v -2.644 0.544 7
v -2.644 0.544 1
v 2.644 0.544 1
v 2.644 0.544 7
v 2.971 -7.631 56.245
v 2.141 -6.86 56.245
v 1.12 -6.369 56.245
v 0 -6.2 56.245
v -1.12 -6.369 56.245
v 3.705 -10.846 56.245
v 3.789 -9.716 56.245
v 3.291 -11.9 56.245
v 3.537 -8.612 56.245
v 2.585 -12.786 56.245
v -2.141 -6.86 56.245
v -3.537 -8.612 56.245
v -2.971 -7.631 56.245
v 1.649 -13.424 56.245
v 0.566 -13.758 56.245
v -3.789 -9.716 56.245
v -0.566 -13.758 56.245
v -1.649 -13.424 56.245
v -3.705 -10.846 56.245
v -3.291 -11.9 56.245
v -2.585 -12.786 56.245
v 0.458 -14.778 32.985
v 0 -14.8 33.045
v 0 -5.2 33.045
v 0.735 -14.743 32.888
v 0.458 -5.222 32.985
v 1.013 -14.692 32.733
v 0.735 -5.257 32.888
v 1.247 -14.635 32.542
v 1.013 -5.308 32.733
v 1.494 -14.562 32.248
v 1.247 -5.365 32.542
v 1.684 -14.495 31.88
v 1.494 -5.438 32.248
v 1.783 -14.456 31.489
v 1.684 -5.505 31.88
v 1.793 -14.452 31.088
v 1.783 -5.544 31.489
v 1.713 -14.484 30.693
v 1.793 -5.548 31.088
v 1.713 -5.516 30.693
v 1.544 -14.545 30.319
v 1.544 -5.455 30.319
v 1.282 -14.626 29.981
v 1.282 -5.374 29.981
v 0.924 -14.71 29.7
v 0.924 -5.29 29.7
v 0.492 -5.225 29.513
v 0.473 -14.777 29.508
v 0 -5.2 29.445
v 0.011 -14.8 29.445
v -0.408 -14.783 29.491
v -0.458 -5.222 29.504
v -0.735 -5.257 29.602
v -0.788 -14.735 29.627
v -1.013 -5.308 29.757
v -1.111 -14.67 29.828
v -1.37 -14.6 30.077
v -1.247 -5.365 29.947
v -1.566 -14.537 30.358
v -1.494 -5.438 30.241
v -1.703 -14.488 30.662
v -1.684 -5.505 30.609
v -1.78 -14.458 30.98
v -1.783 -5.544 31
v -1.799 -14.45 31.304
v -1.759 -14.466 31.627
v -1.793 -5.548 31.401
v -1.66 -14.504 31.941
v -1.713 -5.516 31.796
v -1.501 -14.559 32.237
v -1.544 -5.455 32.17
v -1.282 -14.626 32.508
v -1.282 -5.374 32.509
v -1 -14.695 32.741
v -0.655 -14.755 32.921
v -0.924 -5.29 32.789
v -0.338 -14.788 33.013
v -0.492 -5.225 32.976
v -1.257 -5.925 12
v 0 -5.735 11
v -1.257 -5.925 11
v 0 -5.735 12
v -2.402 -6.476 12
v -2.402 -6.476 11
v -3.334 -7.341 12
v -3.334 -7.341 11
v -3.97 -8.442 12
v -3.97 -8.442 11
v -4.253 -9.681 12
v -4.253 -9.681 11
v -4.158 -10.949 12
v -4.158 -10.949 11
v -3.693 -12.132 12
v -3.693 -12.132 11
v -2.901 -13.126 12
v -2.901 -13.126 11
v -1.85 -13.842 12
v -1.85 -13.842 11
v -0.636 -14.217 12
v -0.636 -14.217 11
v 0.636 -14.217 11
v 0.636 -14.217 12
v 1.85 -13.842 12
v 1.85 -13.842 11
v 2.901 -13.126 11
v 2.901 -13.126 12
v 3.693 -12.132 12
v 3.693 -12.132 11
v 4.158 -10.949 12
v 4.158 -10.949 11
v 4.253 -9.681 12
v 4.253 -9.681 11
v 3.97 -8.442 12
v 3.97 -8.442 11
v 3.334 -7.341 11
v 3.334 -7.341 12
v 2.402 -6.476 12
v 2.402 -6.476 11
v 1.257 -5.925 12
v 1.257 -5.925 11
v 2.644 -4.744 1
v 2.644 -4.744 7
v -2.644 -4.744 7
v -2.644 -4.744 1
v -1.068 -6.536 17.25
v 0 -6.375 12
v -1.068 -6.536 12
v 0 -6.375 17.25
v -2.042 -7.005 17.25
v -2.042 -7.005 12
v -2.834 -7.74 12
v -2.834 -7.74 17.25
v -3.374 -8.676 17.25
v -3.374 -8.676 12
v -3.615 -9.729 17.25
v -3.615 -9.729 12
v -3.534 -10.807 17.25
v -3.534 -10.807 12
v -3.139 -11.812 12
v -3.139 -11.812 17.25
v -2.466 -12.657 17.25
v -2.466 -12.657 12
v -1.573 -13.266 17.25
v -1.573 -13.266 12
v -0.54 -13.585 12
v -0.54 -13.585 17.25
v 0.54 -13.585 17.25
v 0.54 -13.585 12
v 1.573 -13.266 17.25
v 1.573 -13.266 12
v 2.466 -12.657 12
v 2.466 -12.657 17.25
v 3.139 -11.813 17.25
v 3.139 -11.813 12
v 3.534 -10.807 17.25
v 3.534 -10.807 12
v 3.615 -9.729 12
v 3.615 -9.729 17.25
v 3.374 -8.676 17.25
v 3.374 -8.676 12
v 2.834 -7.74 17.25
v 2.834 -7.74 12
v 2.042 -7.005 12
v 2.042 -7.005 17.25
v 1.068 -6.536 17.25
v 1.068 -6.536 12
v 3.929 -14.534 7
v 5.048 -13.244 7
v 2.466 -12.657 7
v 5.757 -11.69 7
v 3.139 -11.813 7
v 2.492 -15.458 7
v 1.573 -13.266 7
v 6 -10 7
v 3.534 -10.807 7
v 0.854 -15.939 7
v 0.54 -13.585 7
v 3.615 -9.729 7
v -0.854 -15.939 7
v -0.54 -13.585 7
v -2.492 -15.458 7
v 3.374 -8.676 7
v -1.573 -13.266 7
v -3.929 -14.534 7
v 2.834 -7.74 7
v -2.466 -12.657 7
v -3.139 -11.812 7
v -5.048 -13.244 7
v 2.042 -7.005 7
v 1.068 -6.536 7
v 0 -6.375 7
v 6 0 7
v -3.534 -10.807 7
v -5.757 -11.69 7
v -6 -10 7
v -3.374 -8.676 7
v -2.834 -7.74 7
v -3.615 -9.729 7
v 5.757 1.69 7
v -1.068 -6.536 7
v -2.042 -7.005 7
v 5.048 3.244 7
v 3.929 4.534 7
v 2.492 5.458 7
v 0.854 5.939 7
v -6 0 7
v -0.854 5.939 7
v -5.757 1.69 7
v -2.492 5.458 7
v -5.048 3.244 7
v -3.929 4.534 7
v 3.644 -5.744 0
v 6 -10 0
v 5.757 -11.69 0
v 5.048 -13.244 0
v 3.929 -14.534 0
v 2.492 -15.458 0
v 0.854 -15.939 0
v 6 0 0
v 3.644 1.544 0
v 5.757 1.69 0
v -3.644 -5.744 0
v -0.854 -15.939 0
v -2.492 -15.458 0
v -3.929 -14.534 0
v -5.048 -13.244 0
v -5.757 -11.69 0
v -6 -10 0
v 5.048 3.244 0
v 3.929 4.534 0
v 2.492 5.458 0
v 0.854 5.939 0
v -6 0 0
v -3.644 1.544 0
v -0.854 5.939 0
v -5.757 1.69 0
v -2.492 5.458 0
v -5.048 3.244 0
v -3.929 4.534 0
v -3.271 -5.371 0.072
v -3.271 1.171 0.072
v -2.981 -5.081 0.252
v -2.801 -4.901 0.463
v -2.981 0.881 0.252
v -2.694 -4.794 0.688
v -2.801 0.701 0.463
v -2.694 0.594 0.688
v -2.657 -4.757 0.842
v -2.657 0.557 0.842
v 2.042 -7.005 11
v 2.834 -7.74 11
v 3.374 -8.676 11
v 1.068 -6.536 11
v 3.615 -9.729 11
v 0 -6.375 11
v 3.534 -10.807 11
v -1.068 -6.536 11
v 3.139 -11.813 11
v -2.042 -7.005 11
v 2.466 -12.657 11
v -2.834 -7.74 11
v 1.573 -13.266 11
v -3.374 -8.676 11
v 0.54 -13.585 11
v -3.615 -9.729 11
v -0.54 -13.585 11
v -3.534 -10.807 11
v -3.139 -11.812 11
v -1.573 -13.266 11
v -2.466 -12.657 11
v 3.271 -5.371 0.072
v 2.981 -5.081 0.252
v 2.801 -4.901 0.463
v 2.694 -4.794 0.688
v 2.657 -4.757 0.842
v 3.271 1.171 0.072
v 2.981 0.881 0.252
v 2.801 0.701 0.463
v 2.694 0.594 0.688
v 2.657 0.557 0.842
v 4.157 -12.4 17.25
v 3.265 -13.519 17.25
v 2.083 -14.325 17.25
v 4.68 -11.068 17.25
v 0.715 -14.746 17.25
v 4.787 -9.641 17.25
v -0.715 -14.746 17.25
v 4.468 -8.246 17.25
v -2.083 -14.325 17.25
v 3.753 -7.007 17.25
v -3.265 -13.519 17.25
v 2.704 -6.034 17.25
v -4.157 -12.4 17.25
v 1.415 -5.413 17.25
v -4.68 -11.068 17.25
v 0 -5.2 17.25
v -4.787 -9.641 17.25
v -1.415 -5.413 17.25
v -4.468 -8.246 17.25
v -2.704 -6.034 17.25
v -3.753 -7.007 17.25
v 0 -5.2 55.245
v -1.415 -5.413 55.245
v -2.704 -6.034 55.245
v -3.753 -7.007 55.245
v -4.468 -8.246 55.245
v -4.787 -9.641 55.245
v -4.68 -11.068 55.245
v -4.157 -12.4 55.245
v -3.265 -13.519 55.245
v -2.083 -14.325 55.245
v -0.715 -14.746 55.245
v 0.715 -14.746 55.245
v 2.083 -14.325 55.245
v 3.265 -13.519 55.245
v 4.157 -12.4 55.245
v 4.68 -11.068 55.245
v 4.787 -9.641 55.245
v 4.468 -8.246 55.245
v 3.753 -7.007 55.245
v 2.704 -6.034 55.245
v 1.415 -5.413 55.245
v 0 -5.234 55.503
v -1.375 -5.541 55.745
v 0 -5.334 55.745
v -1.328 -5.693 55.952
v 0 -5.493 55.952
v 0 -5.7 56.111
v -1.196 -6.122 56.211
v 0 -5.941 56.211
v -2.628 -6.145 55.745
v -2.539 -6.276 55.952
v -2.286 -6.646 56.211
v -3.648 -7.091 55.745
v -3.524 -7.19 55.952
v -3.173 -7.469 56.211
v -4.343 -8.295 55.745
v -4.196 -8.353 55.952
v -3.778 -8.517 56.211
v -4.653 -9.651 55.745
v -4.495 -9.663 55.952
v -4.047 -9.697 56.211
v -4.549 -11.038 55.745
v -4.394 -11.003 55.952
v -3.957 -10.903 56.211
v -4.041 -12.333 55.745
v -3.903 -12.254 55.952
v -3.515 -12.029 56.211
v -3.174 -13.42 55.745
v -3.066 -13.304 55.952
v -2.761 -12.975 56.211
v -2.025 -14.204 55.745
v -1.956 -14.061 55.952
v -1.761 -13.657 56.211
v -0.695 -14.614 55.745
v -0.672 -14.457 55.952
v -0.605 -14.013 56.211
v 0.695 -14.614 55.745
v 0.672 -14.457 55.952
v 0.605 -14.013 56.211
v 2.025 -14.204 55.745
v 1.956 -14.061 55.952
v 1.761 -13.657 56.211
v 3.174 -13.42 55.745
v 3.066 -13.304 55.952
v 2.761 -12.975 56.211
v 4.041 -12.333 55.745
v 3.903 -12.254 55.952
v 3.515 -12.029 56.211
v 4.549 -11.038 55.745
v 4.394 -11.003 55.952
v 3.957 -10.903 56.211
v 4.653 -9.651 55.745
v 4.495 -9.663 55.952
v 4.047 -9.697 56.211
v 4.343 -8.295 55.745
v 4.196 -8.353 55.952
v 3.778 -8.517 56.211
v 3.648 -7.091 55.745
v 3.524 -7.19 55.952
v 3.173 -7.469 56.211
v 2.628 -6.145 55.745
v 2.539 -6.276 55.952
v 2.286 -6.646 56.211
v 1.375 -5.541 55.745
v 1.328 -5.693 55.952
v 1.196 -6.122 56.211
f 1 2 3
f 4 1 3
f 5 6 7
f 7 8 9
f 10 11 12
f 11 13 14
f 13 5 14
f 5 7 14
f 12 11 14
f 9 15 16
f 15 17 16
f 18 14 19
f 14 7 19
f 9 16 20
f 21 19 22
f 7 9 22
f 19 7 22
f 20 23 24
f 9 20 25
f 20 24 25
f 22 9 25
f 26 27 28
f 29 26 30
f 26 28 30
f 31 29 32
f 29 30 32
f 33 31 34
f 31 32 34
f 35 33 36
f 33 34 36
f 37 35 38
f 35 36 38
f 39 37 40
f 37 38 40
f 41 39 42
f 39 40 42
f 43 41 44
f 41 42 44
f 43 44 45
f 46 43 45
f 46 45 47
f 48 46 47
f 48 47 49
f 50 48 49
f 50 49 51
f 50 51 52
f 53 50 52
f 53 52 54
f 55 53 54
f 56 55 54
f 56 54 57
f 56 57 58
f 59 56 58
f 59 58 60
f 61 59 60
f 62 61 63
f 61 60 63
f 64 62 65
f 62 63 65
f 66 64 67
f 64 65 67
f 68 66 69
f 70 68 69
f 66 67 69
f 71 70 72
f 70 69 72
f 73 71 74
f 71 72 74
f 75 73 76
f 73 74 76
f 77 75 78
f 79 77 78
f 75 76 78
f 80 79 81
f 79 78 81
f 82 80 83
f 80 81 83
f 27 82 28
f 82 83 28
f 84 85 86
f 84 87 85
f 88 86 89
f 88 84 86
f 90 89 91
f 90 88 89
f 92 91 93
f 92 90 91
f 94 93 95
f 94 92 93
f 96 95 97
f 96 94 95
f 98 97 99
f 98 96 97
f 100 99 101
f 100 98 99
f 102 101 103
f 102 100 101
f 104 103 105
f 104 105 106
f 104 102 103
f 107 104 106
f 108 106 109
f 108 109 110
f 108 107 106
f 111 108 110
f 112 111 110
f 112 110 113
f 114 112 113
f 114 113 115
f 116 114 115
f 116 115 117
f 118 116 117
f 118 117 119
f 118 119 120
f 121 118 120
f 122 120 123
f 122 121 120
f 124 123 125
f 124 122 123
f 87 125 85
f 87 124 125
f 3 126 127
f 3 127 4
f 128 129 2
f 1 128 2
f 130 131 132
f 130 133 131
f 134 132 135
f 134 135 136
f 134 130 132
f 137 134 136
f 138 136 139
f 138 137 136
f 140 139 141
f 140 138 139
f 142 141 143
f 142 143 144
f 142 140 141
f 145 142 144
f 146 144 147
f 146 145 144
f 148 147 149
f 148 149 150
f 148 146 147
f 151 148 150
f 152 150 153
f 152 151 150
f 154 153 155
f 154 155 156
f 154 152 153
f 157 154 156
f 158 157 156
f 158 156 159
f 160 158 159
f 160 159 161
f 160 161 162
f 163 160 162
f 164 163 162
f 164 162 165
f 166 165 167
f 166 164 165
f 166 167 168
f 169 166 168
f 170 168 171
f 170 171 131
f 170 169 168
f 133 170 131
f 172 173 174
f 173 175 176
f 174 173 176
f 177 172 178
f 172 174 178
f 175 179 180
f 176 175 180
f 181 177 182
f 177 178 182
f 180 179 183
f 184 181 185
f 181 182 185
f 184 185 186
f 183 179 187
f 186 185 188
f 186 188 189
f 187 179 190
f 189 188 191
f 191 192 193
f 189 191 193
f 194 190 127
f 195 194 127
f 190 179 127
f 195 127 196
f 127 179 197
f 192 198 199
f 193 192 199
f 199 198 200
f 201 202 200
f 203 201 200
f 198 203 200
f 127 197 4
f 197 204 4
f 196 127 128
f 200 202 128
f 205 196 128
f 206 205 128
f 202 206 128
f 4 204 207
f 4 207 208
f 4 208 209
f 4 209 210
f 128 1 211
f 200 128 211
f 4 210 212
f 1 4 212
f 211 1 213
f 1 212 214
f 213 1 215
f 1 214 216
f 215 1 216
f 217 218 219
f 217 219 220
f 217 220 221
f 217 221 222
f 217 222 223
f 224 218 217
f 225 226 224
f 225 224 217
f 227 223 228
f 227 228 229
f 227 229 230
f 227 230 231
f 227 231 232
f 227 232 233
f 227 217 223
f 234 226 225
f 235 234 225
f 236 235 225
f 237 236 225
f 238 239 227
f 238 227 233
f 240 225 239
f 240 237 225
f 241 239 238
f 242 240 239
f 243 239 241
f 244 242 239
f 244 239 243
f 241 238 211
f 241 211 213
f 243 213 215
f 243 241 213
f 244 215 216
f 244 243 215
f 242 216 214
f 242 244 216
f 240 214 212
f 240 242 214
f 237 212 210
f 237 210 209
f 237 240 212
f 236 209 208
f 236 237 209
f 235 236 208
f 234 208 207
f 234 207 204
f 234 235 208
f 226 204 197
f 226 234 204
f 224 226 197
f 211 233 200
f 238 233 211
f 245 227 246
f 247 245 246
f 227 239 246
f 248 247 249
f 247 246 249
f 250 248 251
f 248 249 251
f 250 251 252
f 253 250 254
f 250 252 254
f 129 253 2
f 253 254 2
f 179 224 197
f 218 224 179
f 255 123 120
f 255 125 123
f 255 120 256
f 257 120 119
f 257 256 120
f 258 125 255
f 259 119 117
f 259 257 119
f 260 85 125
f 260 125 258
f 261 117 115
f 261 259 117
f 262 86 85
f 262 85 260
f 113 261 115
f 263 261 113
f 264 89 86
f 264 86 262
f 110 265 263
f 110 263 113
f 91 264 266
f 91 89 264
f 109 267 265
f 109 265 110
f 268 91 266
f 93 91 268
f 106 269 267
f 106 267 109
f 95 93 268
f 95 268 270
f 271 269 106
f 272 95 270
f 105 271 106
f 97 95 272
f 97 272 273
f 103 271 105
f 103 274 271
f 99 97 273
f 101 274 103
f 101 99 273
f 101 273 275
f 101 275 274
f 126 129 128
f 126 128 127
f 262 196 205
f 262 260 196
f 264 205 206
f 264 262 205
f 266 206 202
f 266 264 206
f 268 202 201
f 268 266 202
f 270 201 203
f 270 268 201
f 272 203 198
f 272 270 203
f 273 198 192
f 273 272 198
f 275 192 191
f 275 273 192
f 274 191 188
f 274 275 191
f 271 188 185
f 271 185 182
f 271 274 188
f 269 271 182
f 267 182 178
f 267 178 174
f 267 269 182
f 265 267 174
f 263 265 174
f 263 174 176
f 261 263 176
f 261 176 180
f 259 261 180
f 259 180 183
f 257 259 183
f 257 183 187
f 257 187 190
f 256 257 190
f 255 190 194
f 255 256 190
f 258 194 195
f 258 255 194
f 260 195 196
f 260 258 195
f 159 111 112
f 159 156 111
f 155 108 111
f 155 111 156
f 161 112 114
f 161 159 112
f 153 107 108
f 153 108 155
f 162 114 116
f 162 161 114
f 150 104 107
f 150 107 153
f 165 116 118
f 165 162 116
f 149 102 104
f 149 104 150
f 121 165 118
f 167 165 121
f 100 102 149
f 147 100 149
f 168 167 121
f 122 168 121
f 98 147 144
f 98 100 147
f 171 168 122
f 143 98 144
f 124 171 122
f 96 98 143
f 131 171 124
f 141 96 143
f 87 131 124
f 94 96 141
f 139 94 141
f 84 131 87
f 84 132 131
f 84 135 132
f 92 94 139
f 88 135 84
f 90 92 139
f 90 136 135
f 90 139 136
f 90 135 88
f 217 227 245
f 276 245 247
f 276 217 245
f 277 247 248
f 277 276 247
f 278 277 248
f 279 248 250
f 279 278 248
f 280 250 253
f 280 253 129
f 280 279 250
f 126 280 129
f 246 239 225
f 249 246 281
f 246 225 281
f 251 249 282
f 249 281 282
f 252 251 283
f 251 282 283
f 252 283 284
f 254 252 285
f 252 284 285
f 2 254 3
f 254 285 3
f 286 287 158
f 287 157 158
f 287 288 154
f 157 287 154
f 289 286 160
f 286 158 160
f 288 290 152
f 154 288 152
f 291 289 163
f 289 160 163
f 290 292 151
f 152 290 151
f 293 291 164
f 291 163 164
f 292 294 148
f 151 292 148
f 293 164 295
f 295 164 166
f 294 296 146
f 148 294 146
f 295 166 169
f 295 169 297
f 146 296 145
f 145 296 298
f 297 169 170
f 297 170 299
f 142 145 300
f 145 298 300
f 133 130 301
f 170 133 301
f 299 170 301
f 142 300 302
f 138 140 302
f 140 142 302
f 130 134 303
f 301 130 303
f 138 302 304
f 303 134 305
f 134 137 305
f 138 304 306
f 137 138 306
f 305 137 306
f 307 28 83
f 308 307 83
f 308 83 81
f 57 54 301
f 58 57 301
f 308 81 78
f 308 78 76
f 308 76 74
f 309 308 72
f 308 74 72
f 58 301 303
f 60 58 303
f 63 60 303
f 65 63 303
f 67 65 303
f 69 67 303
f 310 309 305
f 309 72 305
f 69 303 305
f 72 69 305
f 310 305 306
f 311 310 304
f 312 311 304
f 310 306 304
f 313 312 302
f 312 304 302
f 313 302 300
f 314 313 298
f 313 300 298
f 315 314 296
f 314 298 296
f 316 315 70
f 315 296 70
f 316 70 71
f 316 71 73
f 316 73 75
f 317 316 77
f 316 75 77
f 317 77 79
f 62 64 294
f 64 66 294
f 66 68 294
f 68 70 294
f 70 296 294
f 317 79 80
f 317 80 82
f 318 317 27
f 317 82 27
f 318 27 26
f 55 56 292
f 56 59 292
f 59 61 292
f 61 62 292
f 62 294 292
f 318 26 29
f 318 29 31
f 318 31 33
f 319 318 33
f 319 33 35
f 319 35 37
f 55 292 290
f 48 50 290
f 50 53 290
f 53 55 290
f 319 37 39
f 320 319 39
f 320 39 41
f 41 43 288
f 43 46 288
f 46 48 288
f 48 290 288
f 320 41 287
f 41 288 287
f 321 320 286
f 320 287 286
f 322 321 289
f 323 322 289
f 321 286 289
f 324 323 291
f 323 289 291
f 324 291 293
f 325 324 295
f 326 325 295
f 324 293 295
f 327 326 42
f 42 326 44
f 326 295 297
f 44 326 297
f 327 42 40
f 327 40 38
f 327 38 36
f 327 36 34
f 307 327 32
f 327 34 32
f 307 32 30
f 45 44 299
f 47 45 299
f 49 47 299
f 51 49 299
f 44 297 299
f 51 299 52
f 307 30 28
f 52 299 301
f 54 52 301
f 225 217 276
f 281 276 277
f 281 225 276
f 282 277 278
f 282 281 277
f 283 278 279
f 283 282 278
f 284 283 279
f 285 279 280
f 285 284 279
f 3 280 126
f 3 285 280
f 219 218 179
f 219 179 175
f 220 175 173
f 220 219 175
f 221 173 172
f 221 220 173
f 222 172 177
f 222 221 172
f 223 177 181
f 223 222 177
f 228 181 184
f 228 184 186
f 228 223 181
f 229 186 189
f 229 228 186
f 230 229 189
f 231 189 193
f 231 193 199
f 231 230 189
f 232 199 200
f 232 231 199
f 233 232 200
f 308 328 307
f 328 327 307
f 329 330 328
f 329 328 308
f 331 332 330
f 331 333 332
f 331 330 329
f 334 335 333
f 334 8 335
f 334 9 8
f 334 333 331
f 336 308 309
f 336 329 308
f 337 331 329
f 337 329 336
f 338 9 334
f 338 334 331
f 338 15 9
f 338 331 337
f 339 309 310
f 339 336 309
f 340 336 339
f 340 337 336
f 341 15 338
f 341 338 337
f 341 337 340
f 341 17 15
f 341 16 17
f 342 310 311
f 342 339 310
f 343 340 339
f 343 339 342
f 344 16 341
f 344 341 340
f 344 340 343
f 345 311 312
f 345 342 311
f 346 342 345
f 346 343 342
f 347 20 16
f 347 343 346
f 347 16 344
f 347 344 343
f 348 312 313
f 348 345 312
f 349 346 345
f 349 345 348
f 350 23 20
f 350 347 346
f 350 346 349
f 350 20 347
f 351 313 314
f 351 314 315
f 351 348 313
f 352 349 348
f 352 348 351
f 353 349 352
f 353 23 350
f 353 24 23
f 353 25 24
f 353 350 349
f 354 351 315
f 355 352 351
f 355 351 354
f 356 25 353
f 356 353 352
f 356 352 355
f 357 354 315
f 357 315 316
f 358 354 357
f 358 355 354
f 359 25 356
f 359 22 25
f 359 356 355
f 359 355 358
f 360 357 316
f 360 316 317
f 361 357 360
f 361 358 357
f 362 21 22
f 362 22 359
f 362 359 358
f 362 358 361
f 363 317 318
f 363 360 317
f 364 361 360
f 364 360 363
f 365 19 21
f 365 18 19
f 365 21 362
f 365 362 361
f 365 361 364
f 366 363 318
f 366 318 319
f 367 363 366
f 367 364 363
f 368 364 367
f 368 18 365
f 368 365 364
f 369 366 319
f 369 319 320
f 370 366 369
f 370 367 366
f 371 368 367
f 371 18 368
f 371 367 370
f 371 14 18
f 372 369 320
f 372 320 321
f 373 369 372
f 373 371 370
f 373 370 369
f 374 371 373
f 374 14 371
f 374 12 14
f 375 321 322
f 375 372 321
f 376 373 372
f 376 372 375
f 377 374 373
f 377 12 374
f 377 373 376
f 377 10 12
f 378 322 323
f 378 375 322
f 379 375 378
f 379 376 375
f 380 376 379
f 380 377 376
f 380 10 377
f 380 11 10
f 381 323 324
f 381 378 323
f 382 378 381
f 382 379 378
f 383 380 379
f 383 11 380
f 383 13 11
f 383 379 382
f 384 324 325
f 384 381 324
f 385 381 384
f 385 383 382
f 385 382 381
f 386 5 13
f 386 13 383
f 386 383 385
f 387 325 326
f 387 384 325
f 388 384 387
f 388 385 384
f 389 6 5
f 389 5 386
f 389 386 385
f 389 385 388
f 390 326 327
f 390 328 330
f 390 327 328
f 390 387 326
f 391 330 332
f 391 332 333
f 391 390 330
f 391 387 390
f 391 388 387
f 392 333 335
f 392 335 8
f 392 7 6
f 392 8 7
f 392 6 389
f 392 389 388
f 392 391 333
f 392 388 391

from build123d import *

# Parameters (mm, degrees)
SKETCH1_W           = 5.288
SKETCH1_H           = 5.288
BOSS_EXTRUDE1_DEPTH = 7
FILLET1_R           = 1
FILLET2_R           = 1
SKETCH6_R           = 1.8
CUT_EXTRUDE1_DEPTH  = 58.661920682


with BuildPart() as part:
    # Sketch1 → Boss-Extrude1 (new body)
    with BuildSketch(Plane.XY):
        with BuildLine():
            Line((6, 0), (6, -10))
            ThreePointArc((6, -10), (0, -16), (-6, -10))
            Line((-6, -10), (-6, 0))
            ThreePointArc((-6, 0), (0, 6), (6, 0))
        make_face()
        with Locations((0, -2.1)):
            Rectangle(SKETCH1_W, SKETCH1_H, mode=Mode.SUBTRACT)
    extrude(amount=BOSS_EXTRUDE1_DEPTH)

    # Sketch4 → Revolve1 (revolve)
    with BuildSketch(Plane(origin=(0, 0, 0), x_dir=(0, 0, -1), z_dir=(1, 0, 0)), mode=Mode.PRIVATE) as revolve1_sk:
        Polygon((-7, -13.625), (-11, -13.625), (-11, -14.264510891), (-12, -14.264510891), (-12, -13.625), (-17.25, -13.625), (-17.25, -14.264510891), (-17.25, -14.8), (-20.259244151, -14.8), (-56.24461838, -14.8), (-56.24461838, -13.625), (-56.24461838, -10), (-7, -10), align=None)
    revolve(revolve1_sk.sketch.rotate(Axis((0, -10, 7), (0, 0, 1)), 180), axis=Axis((0, -10, 7), (0, 0, 1)))

    # Fillet1
    fillet1_edges = [part.edges().sort_by_distance(p)[0] for p in [
        (2.644, -2.1, 0),
        (0, 0.544, 0),
        (-2.644, -2.1, 0),
        (0, -4.744, 0),
    ]]
    fillet(fillet1_edges, radius=FILLET1_R)

    # Fillet2
    fillet2_edges = [part.edges().sort_by_distance(p)[0] for p in [
        (0, -14.8, 56.24461838),
    ]]
    fillet(fillet2_edges, radius=FILLET2_R)

    # Sketch6 → Cut-Extrude1 (cut, through all)
    with BuildSketch(Plane(origin=(0, -5.2, 0), x_dir=(1, 0, 0), z_dir=(0, 1, 0))):
        with Locations(Location((0, -31.24461838, 0), (0, 0, 270))):
            Circle(SKETCH6_R)
    extrude(amount=-CUT_EXTRUDE1_DEPTH, mode=Mode.SUBTRACT)


solid = part.part
